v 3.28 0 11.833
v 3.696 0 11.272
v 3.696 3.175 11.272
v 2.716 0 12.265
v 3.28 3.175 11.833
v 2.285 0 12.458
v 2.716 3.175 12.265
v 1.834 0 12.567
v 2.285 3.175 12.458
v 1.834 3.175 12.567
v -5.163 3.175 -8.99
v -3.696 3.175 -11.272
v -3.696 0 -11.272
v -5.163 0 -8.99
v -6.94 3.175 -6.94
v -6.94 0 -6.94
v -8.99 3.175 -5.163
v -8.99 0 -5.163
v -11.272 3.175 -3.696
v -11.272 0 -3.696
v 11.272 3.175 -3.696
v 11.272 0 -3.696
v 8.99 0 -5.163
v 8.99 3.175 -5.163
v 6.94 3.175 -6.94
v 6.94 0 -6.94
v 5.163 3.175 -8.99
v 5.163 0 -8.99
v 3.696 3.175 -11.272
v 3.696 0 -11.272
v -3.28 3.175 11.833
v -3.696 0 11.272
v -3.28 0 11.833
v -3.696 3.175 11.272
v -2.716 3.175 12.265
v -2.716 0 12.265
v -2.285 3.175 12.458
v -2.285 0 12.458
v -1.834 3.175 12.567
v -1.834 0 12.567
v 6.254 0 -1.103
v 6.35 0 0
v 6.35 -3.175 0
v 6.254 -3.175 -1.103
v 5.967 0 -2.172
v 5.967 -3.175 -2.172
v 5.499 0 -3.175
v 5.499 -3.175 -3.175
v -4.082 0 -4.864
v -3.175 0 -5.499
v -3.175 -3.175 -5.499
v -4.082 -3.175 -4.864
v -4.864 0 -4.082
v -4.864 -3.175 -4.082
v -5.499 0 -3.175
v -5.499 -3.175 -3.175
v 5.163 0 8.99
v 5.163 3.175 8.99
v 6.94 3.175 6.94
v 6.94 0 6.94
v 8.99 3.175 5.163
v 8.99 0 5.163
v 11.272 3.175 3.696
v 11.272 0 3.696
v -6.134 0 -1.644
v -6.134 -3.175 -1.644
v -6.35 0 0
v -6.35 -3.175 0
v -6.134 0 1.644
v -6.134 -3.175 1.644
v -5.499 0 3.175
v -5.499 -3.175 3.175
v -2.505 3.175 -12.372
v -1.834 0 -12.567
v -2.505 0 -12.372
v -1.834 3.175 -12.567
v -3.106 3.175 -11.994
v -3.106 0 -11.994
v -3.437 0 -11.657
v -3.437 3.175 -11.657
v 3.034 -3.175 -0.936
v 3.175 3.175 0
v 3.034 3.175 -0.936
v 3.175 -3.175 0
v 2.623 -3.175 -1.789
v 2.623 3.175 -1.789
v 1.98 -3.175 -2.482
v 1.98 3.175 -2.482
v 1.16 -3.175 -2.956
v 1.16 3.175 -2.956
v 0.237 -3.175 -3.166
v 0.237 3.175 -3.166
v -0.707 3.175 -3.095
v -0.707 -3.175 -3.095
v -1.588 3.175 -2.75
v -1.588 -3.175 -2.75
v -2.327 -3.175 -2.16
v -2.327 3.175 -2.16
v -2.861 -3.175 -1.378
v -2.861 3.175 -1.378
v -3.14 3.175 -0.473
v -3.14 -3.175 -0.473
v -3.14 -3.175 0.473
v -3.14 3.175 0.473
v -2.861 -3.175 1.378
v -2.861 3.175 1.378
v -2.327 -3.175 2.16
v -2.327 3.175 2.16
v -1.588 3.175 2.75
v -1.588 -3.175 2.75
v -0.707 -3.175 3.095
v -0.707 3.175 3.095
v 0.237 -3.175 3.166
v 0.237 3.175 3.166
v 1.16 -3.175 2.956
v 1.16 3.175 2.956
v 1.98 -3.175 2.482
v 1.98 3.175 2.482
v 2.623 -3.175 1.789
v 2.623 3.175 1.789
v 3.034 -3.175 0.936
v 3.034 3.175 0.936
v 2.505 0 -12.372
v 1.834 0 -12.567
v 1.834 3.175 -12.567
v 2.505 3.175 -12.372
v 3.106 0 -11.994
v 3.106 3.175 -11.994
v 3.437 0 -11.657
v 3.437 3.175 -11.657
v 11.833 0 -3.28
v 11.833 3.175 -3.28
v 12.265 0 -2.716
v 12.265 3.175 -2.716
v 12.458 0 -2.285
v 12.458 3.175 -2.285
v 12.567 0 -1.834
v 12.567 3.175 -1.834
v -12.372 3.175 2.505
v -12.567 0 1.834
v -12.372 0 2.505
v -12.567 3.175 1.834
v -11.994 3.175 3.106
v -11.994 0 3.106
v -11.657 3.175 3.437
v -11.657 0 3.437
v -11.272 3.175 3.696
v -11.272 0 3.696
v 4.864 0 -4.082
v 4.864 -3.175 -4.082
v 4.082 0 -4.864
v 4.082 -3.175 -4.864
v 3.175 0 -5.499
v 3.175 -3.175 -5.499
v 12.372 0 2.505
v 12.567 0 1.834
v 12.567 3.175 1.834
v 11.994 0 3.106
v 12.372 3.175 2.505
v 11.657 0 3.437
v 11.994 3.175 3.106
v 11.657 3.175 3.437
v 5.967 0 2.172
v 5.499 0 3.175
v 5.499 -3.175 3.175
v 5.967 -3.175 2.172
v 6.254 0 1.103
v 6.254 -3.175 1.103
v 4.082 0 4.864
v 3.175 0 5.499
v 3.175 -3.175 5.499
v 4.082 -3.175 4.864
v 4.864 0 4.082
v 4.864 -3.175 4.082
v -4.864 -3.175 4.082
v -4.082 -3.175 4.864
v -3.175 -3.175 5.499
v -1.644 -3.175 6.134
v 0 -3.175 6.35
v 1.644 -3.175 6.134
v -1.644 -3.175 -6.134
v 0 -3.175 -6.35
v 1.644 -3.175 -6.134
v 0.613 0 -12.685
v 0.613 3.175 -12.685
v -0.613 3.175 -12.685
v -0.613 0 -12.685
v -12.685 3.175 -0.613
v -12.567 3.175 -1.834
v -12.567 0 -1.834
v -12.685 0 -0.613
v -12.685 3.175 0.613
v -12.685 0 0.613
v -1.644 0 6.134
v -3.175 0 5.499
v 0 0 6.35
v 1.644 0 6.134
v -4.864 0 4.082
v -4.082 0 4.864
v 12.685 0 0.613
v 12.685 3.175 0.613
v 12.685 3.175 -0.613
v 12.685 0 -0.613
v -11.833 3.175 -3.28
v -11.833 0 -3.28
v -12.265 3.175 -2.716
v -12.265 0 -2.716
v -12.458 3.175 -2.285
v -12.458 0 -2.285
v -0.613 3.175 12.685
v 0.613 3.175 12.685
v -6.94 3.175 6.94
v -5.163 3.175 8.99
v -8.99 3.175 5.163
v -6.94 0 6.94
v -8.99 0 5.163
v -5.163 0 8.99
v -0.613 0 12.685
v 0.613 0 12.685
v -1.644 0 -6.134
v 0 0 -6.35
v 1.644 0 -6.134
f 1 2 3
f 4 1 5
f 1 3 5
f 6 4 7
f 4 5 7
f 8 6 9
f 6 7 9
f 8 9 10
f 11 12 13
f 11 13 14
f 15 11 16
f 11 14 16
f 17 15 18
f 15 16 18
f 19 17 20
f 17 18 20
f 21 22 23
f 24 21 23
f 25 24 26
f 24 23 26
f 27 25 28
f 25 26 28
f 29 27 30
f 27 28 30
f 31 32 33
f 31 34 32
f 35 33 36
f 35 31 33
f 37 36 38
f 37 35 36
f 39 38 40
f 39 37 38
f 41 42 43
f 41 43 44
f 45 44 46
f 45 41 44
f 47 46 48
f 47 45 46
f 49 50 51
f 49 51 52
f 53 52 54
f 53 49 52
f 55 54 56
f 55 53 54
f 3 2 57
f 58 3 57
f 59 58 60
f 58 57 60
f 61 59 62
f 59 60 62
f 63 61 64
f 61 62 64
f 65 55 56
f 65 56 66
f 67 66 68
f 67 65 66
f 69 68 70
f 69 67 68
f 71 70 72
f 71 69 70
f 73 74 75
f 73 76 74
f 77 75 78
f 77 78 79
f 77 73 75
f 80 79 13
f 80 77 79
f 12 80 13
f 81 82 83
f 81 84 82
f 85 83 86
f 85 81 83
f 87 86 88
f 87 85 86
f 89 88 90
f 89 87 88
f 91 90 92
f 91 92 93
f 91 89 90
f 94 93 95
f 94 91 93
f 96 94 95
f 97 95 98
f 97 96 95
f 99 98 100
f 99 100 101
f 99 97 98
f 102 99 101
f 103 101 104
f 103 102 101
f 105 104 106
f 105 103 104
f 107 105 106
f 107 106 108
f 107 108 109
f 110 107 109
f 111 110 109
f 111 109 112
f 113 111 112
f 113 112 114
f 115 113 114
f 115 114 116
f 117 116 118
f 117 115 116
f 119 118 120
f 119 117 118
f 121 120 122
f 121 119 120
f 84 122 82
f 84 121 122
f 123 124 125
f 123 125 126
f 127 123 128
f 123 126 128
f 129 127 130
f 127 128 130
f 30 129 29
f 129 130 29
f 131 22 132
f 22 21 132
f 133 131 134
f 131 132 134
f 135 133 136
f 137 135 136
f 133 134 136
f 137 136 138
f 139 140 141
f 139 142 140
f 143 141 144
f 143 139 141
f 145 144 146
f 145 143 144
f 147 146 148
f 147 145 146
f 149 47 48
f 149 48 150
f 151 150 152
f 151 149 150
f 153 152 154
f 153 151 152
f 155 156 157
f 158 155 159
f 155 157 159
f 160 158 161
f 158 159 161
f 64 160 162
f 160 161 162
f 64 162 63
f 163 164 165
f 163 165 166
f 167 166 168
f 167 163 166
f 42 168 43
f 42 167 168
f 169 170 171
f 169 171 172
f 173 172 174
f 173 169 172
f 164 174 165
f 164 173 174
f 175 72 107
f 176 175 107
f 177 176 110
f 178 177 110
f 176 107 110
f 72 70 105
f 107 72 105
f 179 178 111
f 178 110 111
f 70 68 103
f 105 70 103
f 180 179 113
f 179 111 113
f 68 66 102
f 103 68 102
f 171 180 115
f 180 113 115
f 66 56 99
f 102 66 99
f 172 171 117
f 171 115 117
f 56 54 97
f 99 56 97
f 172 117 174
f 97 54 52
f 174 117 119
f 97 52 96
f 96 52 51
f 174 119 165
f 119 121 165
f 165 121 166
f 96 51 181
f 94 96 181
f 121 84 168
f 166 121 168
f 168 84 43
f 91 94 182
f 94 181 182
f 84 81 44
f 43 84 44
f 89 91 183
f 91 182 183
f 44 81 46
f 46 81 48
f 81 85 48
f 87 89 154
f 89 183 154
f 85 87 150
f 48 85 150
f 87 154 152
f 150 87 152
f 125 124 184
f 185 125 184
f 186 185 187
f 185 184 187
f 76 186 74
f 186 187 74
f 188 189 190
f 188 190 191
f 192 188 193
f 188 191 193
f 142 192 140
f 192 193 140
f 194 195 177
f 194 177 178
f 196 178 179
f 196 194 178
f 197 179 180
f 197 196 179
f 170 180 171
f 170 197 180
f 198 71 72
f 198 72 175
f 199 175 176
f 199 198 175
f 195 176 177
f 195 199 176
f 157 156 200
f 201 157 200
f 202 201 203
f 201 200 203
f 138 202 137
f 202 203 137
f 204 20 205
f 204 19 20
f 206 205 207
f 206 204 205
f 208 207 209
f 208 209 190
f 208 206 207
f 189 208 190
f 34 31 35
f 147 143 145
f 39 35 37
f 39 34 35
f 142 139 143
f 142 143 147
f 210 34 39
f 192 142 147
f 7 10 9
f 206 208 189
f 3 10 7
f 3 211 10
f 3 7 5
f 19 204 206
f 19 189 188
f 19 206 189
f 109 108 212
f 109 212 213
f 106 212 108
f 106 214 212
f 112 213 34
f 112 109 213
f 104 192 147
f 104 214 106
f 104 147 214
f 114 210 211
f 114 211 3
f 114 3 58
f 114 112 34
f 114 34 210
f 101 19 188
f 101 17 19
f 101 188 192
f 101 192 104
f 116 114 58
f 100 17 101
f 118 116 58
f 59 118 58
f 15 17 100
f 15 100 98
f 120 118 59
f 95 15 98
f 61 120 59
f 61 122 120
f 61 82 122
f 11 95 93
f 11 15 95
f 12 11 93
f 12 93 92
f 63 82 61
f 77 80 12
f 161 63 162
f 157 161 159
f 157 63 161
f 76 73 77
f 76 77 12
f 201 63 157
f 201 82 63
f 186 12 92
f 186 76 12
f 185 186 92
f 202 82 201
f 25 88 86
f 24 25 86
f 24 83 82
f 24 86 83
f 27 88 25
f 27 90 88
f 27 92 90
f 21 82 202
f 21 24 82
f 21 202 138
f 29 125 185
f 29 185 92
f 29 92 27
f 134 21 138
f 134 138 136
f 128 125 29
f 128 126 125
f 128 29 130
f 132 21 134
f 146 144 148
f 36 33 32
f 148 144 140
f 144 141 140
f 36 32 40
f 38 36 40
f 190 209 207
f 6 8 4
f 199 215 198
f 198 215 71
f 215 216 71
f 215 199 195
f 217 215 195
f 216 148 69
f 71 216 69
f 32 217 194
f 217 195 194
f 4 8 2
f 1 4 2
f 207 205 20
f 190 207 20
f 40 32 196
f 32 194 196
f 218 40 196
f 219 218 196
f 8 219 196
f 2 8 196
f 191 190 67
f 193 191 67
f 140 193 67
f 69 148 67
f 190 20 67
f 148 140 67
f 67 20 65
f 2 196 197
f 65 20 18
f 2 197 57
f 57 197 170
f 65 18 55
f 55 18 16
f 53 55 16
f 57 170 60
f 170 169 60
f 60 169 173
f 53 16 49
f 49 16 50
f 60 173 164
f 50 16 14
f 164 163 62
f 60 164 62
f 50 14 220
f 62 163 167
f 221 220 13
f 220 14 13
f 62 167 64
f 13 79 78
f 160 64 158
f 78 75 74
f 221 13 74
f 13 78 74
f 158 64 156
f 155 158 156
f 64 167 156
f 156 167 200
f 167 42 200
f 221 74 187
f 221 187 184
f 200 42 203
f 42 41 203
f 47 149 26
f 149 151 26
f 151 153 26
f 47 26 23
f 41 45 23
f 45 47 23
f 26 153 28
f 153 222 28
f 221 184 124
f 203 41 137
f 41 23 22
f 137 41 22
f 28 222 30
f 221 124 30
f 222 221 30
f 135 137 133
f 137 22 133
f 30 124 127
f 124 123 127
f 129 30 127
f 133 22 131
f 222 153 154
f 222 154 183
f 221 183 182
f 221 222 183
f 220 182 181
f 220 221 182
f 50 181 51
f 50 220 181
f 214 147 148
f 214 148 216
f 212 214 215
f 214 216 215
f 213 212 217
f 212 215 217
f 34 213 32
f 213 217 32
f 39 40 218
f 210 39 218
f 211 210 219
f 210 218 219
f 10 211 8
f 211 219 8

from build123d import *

# Parameters (mm, degrees)
SKETCH1_R           = 3.175
BOSS_EXTRUDE1_DEPTH = 3.175
BOSS_EXTRUDE2_START = -3.175
SKETCH1_3_R         = 3.175
BOSS_EXTRUDE2_DEPTH = 3.175
FILLET1_R           = 2.54


with BuildPart() as part:
    # Sketch1 → Boss-Extrude1 (new body)
    with BuildSketch(Plane(origin=(0, 0, 0), x_dir=(1, 0, 0), z_dir=(0, 1, 0))):
        with BuildLine():
            ThreePointArc((-3.175, 12.296722124), (-6.940246952, 6.940246952), (-12.296722124, 3.175))
            ThreePointArc((-12.296722124, 3.175), (-12.7, 0), (-12.296722124, -3.175))
            ThreePointArc((-12.296722124, -3.175), (-6.940246952, -6.940246952), (-3.175, -12.296722124))
            ThreePointArc((-3.175, -12.296722124), (0, -12.7), (3.175, -12.296722124))
            ThreePointArc((3.175, -12.296722124), (6.940246952, -6.940246952), (12.296722124, -3.175))
            ThreePointArc((12.296722124, -3.175), (12.7, 0), (12.296722124, 3.175))
            ThreePointArc((12.296722124, 3.175), (6.940246952, 6.940246952), (3.175, 12.296722124))
            ThreePointArc((3.175, 12.296722124), (0, 12.7), (-3.175, 12.296722124))
        make_face()
        Circle(SKETCH1_R, mode=Mode.SUBTRACT)
    extrude(amount=BOSS_EXTRUDE1_DEPTH)

    # Sketch1<3> → Boss-Extrude2 (add)
    with BuildSketch(Plane(origin=(0, 0, 0), x_dir=(1, 0, 0), z_dir=(0, 1, 0)).offset(BOSS_EXTRUDE2_START)):
        with BuildLine():
            ThreePointArc((3.175, 5.499261314), (0, 6.35), (-3.175, 5.499261314))
            ThreePointArc((-3.175, 5.499261314), (-4.490128061, 4.490128061), (-5.499261314, 3.175))
            ThreePointArc((-5.499261314, 3.175), (-6.35, 0), (-5.499261314, -3.175))
            ThreePointArc((-5.499261314, -3.175), (-4.490128061, -4.490128061), (-3.175, -5.499261314))
            ThreePointArc((-3.175, -5.499261314), (0, -6.35), (3.175, -5.499261314))
            ThreePointArc((3.175, -5.499261314), (4.490128061, -4.490128061), (5.499261314, -3.175))
            ThreePointArc((5.499261314, -3.175), (6.133628997, -1.643500936), (6.35, 0))
            ThreePointArc((6.35, 0), (6.133628997, 1.643500936), (5.499261314, 3.175))
            ThreePointArc((5.499261314, 3.175), (4.490128061, 4.490128061), (3.175, 5.499261314))
        make_face()
        Circle(SKETCH1_3_R, mode=Mode.SUBTRACT)
    extrude(amount=BOSS_EXTRUDE2_DEPTH)

    # Fillet1
    fillet1_edges = [part.edges().sort_by_distance(p)[0] for p in [
        (12.296722124, 1.5875, -3.175),
        (12.296722124, 1.5875, 3.175),
        (3.175, 1.5875, 12.296722124),
        (-3.175, 1.5875, 12.296722124),
        (-12.296722124, 1.5875, 3.175),
        (-12.296722124, 1.5875, -3.175),
        (3.175, 1.5875, -12.296722124),
        (-3.175, 1.5875, -12.296722124),
    ]]
    fillet(fillet1_edges, radius=FILLET1_R)


solid = part.part
